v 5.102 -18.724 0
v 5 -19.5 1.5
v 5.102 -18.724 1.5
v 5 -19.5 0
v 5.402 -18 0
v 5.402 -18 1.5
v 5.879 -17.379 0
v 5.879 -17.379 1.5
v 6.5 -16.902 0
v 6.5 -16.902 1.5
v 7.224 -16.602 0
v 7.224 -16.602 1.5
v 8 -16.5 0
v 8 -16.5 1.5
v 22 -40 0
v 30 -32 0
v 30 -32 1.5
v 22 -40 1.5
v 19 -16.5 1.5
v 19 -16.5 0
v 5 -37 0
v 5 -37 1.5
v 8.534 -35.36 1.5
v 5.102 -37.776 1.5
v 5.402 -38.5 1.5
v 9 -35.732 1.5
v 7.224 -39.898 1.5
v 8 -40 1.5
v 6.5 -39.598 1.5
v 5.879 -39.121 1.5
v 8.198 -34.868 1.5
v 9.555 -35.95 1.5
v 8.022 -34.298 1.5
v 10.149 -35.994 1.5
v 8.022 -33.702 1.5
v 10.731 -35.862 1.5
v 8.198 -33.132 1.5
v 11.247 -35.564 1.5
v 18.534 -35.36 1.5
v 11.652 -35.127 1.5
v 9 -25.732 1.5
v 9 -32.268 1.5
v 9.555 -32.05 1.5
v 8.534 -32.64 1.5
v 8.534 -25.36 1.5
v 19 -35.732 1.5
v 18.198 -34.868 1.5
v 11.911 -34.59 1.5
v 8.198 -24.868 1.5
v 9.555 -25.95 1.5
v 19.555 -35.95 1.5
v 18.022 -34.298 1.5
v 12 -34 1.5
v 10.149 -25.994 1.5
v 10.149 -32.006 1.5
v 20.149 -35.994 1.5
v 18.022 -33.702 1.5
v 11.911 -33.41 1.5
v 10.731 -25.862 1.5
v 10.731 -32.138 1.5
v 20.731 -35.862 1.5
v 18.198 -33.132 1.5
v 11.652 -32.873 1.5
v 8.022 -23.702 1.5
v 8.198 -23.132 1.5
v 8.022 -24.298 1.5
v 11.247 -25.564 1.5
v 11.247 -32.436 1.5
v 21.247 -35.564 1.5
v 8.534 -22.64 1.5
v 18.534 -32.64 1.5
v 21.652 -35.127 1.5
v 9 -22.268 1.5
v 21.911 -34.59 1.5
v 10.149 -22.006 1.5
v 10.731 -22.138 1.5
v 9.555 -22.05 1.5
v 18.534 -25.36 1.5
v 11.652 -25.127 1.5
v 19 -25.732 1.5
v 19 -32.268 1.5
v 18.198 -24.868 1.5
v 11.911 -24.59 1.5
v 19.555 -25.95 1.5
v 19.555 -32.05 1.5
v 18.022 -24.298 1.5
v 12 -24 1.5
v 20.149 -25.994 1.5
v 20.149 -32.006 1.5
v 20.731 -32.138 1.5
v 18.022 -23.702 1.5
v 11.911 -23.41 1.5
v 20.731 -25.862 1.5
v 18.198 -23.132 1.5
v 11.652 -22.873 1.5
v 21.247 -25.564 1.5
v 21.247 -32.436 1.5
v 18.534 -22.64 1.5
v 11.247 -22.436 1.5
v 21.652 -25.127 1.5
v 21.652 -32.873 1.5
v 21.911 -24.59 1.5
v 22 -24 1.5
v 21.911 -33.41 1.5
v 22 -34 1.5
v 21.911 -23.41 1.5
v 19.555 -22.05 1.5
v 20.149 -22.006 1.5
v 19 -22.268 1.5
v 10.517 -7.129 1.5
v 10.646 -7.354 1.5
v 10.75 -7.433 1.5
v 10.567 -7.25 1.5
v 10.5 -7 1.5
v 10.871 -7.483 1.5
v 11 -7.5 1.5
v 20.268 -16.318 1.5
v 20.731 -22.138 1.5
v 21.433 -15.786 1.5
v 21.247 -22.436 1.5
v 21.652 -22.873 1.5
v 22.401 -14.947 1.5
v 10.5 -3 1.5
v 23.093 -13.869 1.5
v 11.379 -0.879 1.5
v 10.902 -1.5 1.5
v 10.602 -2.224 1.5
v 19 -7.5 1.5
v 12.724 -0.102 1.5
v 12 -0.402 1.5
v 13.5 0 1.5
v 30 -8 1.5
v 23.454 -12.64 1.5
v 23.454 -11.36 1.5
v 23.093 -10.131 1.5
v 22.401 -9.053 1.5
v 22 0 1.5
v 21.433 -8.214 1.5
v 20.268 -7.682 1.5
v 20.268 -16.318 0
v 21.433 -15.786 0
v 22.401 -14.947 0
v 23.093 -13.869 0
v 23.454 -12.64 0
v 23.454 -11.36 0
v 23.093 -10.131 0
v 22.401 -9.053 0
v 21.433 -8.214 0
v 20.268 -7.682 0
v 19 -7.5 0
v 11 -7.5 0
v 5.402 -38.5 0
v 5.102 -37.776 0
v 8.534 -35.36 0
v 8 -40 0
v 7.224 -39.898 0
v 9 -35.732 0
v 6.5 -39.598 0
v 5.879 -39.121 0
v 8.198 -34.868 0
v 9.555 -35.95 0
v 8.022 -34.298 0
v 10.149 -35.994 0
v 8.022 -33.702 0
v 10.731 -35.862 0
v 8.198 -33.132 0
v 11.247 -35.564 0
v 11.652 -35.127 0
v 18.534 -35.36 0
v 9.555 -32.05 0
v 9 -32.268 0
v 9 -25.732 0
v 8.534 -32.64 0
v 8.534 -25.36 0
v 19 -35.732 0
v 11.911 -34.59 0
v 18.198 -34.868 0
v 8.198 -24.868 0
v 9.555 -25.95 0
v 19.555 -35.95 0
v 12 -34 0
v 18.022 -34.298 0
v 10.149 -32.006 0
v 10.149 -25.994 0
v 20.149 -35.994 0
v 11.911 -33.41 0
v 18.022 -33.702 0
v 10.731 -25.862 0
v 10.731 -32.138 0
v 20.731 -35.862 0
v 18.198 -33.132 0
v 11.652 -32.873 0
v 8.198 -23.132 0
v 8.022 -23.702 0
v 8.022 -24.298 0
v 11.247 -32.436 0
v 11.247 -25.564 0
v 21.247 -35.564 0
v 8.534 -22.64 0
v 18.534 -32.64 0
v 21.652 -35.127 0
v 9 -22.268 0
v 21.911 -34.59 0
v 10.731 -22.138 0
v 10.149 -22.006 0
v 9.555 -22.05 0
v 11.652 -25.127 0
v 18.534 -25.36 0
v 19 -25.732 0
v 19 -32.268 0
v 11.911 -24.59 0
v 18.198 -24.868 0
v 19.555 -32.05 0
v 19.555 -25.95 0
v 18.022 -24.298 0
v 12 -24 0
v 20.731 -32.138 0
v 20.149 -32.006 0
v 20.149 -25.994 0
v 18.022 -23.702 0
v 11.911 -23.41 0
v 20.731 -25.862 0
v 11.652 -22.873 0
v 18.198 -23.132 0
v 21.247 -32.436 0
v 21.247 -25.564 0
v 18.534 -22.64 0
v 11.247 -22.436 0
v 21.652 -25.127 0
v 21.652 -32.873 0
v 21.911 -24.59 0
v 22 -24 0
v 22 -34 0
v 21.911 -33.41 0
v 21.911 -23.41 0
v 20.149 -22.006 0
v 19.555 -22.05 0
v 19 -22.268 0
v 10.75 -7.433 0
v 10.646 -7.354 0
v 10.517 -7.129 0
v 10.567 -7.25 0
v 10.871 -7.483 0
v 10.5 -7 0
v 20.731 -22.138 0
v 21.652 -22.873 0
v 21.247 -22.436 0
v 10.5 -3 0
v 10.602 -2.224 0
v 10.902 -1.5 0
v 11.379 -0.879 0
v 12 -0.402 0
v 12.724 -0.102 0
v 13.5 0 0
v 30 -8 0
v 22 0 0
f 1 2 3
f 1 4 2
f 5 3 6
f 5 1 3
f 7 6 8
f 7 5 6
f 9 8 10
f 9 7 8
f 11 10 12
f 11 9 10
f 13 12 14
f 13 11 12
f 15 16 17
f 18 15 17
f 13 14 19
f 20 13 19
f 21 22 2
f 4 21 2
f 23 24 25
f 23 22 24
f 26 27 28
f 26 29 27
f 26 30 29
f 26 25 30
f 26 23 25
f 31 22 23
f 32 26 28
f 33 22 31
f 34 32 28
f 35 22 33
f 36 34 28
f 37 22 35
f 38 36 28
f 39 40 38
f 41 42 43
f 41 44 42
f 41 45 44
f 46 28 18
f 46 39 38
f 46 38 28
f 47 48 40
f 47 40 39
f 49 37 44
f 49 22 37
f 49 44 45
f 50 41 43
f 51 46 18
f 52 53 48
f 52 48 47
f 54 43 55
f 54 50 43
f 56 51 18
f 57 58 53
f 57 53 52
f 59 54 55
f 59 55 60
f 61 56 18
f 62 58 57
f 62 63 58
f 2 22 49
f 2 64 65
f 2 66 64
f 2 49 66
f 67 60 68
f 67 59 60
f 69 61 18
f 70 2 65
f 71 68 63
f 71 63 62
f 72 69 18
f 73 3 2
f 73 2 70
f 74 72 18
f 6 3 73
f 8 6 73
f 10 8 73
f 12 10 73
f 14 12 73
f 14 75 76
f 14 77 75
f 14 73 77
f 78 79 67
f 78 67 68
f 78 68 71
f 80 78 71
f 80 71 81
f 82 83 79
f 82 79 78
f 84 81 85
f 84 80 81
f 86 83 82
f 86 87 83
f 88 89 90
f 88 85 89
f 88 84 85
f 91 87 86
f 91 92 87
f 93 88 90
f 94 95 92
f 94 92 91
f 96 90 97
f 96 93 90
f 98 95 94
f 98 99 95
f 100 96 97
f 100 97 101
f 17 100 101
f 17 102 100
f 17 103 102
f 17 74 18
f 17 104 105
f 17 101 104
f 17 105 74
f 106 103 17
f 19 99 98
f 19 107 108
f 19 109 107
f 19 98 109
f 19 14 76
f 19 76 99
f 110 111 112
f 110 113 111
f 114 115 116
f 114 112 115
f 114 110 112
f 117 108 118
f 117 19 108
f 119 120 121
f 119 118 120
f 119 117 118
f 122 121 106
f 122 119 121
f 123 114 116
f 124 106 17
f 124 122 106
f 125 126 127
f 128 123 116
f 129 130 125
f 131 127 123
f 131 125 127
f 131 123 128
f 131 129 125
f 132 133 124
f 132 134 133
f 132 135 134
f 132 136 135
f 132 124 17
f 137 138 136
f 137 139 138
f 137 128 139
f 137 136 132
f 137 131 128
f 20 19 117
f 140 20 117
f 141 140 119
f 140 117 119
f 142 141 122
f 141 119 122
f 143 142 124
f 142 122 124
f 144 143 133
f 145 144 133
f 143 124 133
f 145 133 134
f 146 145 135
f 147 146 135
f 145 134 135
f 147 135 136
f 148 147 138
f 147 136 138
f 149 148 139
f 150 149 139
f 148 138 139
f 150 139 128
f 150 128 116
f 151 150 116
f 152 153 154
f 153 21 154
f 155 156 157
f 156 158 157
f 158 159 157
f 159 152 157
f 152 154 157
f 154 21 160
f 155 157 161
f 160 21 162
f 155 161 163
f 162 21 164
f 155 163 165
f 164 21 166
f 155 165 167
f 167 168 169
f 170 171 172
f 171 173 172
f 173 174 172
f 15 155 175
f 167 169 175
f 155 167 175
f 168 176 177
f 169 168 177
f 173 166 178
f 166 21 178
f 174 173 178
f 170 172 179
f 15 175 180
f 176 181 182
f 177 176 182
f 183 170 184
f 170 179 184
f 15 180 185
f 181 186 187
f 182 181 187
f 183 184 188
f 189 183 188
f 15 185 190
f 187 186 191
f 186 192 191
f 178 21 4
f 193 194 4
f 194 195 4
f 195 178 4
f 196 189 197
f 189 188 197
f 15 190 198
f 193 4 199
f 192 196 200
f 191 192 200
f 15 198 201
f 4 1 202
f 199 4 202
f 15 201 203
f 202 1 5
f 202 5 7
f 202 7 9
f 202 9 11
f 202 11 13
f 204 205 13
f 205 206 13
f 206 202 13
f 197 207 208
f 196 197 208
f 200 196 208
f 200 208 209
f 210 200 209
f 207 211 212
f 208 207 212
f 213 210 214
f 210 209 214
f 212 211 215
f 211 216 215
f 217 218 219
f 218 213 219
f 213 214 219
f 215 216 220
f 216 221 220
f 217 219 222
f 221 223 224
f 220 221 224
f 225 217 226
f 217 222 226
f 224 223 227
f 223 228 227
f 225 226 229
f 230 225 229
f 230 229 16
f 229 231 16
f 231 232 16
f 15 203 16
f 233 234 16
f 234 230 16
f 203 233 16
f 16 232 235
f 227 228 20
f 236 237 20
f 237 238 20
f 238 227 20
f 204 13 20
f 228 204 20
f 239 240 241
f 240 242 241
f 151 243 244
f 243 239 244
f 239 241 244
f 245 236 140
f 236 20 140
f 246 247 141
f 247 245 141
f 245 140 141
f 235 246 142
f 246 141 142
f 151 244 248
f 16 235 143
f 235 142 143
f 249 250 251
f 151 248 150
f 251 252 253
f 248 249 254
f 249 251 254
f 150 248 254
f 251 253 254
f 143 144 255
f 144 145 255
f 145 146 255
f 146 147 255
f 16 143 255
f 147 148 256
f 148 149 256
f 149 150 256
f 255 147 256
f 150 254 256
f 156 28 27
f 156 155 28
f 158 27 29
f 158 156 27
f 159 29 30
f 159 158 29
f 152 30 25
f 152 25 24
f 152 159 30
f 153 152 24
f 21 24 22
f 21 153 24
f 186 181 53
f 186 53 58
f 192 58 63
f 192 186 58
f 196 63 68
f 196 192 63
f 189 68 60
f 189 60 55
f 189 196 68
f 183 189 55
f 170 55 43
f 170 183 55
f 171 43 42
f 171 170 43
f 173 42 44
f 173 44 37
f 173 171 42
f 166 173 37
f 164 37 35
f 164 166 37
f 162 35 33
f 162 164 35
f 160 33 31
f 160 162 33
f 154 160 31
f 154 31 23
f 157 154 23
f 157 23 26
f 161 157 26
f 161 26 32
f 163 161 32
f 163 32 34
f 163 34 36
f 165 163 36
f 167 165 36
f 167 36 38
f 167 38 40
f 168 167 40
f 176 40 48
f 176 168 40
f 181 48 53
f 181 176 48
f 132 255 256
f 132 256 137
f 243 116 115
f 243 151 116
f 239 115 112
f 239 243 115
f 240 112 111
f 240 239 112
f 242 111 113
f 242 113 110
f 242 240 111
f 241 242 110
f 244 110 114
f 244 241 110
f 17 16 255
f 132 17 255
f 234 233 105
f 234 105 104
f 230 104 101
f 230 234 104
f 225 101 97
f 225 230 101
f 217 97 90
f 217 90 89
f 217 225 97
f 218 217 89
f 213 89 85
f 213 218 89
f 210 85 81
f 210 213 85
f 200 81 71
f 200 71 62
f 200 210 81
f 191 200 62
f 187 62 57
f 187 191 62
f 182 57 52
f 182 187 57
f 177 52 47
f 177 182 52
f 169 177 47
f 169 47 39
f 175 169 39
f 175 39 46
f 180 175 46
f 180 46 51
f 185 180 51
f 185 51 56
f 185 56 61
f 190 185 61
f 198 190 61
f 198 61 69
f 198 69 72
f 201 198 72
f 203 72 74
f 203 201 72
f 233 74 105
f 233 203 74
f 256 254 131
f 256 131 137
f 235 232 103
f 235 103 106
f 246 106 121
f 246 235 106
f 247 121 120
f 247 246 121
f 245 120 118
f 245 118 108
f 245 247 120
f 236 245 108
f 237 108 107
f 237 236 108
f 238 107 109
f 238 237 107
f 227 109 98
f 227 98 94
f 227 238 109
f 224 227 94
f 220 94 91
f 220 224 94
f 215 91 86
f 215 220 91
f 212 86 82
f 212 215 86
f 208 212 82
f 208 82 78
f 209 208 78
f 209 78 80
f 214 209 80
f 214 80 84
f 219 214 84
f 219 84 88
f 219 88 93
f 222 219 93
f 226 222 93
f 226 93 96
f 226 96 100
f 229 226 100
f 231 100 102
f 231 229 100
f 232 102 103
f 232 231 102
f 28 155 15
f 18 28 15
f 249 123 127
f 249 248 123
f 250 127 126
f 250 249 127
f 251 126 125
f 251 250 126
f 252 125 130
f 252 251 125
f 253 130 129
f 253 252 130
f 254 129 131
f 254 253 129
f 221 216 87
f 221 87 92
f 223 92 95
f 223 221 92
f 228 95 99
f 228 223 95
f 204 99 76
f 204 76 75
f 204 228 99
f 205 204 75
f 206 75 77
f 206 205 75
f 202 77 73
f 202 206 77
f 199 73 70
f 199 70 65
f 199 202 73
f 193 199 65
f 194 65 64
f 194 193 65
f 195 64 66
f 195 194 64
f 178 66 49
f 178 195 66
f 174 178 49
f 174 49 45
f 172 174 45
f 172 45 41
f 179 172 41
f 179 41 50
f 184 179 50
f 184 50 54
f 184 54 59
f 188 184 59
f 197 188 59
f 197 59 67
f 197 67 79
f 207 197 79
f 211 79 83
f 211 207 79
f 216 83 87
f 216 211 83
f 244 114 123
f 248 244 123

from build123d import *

# Parameters (mm, degrees)
SKETCH1_W           = 30
SKETCH1_H           = 40
SKETCH1_R           = 2
BOSS_EXTRUDE1_DEPTH = 1.5
CHAMFER1_SIZE       = 8
CUT_EXTRUDE1_DEPTH  = 5
FILLET1_R           = 3
FILLET2_R           = 0.5


with BuildPart() as part:
    # Sketch1 → Boss-Extrude1 (new body)
    with BuildSketch(Plane.XY):
        with Locations((15, -20)):
            Rectangle(SKETCH1_W, SKETCH1_H)
        with Locations((20, -34)):
            Circle(SKETCH1_R, mode=Mode.SUBTRACT)
        with Locations((10, -34)):
            Circle(SKETCH1_R, mode=Mode.SUBTRACT)
        with Locations((20, -24)):
            Circle(SKETCH1_R, mode=Mode.SUBTRACT)
        with Locations((10, -24)):
            Circle(SKETCH1_R, mode=Mode.SUBTRACT)
    extrude(amount=BOSS_EXTRUDE1_DEPTH)

    # Chamfer1
    chamfer1_edges = [part.edges().sort_by_distance(p)[0] for p in [
        (30, 0, 0.75),
        (30, -40, 0.75),
    ]]
    chamfer(chamfer1_edges, length=CHAMFER1_SIZE)

    # Sketch2 → Cut-Extrude1 (cut)
    with BuildSketch(Plane.XY.offset(1.5)):
        with BuildLine():
            Line((5, -16.5), (19, -16.5))
            ThreePointArc((19, -16.5), (23.5, -12), (19, -7.5))
            Line((19, -7.5), (10.5, -7.5))
            Line((10.5, -7.5), (10.5, 0))
            Line((10.5, 0), (0, 0))
            Line((0, 0), (0, -16.5))
            Line((0, -16.5), (0, -40))
            Line((0, -40), (5, -40))
            Line((5, -40), (5, -16.5))
        make_face()
    extrude(amount=-CUT_EXTRUDE1_DEPTH, mode=Mode.SUBTRACT)

    # Fillet1
    fillet1_edges = [part.edges().sort_by_distance(p)[0] for p in [
        (10.5, 0, 0.75),
        (5, -40, 0.75),
        (5, -16.5, 0.75),
    ]]
    fillet(fillet1_edges, radius=FILLET1_R)

    # Fillet2
    fillet2_edges = [part.edges().sort_by_distance(p)[0] for p in [
        (10.5, -7.5, 0.75),
    ]]
    fillet(fillet2_edges, radius=FILLET2_R)


solid = part.part
